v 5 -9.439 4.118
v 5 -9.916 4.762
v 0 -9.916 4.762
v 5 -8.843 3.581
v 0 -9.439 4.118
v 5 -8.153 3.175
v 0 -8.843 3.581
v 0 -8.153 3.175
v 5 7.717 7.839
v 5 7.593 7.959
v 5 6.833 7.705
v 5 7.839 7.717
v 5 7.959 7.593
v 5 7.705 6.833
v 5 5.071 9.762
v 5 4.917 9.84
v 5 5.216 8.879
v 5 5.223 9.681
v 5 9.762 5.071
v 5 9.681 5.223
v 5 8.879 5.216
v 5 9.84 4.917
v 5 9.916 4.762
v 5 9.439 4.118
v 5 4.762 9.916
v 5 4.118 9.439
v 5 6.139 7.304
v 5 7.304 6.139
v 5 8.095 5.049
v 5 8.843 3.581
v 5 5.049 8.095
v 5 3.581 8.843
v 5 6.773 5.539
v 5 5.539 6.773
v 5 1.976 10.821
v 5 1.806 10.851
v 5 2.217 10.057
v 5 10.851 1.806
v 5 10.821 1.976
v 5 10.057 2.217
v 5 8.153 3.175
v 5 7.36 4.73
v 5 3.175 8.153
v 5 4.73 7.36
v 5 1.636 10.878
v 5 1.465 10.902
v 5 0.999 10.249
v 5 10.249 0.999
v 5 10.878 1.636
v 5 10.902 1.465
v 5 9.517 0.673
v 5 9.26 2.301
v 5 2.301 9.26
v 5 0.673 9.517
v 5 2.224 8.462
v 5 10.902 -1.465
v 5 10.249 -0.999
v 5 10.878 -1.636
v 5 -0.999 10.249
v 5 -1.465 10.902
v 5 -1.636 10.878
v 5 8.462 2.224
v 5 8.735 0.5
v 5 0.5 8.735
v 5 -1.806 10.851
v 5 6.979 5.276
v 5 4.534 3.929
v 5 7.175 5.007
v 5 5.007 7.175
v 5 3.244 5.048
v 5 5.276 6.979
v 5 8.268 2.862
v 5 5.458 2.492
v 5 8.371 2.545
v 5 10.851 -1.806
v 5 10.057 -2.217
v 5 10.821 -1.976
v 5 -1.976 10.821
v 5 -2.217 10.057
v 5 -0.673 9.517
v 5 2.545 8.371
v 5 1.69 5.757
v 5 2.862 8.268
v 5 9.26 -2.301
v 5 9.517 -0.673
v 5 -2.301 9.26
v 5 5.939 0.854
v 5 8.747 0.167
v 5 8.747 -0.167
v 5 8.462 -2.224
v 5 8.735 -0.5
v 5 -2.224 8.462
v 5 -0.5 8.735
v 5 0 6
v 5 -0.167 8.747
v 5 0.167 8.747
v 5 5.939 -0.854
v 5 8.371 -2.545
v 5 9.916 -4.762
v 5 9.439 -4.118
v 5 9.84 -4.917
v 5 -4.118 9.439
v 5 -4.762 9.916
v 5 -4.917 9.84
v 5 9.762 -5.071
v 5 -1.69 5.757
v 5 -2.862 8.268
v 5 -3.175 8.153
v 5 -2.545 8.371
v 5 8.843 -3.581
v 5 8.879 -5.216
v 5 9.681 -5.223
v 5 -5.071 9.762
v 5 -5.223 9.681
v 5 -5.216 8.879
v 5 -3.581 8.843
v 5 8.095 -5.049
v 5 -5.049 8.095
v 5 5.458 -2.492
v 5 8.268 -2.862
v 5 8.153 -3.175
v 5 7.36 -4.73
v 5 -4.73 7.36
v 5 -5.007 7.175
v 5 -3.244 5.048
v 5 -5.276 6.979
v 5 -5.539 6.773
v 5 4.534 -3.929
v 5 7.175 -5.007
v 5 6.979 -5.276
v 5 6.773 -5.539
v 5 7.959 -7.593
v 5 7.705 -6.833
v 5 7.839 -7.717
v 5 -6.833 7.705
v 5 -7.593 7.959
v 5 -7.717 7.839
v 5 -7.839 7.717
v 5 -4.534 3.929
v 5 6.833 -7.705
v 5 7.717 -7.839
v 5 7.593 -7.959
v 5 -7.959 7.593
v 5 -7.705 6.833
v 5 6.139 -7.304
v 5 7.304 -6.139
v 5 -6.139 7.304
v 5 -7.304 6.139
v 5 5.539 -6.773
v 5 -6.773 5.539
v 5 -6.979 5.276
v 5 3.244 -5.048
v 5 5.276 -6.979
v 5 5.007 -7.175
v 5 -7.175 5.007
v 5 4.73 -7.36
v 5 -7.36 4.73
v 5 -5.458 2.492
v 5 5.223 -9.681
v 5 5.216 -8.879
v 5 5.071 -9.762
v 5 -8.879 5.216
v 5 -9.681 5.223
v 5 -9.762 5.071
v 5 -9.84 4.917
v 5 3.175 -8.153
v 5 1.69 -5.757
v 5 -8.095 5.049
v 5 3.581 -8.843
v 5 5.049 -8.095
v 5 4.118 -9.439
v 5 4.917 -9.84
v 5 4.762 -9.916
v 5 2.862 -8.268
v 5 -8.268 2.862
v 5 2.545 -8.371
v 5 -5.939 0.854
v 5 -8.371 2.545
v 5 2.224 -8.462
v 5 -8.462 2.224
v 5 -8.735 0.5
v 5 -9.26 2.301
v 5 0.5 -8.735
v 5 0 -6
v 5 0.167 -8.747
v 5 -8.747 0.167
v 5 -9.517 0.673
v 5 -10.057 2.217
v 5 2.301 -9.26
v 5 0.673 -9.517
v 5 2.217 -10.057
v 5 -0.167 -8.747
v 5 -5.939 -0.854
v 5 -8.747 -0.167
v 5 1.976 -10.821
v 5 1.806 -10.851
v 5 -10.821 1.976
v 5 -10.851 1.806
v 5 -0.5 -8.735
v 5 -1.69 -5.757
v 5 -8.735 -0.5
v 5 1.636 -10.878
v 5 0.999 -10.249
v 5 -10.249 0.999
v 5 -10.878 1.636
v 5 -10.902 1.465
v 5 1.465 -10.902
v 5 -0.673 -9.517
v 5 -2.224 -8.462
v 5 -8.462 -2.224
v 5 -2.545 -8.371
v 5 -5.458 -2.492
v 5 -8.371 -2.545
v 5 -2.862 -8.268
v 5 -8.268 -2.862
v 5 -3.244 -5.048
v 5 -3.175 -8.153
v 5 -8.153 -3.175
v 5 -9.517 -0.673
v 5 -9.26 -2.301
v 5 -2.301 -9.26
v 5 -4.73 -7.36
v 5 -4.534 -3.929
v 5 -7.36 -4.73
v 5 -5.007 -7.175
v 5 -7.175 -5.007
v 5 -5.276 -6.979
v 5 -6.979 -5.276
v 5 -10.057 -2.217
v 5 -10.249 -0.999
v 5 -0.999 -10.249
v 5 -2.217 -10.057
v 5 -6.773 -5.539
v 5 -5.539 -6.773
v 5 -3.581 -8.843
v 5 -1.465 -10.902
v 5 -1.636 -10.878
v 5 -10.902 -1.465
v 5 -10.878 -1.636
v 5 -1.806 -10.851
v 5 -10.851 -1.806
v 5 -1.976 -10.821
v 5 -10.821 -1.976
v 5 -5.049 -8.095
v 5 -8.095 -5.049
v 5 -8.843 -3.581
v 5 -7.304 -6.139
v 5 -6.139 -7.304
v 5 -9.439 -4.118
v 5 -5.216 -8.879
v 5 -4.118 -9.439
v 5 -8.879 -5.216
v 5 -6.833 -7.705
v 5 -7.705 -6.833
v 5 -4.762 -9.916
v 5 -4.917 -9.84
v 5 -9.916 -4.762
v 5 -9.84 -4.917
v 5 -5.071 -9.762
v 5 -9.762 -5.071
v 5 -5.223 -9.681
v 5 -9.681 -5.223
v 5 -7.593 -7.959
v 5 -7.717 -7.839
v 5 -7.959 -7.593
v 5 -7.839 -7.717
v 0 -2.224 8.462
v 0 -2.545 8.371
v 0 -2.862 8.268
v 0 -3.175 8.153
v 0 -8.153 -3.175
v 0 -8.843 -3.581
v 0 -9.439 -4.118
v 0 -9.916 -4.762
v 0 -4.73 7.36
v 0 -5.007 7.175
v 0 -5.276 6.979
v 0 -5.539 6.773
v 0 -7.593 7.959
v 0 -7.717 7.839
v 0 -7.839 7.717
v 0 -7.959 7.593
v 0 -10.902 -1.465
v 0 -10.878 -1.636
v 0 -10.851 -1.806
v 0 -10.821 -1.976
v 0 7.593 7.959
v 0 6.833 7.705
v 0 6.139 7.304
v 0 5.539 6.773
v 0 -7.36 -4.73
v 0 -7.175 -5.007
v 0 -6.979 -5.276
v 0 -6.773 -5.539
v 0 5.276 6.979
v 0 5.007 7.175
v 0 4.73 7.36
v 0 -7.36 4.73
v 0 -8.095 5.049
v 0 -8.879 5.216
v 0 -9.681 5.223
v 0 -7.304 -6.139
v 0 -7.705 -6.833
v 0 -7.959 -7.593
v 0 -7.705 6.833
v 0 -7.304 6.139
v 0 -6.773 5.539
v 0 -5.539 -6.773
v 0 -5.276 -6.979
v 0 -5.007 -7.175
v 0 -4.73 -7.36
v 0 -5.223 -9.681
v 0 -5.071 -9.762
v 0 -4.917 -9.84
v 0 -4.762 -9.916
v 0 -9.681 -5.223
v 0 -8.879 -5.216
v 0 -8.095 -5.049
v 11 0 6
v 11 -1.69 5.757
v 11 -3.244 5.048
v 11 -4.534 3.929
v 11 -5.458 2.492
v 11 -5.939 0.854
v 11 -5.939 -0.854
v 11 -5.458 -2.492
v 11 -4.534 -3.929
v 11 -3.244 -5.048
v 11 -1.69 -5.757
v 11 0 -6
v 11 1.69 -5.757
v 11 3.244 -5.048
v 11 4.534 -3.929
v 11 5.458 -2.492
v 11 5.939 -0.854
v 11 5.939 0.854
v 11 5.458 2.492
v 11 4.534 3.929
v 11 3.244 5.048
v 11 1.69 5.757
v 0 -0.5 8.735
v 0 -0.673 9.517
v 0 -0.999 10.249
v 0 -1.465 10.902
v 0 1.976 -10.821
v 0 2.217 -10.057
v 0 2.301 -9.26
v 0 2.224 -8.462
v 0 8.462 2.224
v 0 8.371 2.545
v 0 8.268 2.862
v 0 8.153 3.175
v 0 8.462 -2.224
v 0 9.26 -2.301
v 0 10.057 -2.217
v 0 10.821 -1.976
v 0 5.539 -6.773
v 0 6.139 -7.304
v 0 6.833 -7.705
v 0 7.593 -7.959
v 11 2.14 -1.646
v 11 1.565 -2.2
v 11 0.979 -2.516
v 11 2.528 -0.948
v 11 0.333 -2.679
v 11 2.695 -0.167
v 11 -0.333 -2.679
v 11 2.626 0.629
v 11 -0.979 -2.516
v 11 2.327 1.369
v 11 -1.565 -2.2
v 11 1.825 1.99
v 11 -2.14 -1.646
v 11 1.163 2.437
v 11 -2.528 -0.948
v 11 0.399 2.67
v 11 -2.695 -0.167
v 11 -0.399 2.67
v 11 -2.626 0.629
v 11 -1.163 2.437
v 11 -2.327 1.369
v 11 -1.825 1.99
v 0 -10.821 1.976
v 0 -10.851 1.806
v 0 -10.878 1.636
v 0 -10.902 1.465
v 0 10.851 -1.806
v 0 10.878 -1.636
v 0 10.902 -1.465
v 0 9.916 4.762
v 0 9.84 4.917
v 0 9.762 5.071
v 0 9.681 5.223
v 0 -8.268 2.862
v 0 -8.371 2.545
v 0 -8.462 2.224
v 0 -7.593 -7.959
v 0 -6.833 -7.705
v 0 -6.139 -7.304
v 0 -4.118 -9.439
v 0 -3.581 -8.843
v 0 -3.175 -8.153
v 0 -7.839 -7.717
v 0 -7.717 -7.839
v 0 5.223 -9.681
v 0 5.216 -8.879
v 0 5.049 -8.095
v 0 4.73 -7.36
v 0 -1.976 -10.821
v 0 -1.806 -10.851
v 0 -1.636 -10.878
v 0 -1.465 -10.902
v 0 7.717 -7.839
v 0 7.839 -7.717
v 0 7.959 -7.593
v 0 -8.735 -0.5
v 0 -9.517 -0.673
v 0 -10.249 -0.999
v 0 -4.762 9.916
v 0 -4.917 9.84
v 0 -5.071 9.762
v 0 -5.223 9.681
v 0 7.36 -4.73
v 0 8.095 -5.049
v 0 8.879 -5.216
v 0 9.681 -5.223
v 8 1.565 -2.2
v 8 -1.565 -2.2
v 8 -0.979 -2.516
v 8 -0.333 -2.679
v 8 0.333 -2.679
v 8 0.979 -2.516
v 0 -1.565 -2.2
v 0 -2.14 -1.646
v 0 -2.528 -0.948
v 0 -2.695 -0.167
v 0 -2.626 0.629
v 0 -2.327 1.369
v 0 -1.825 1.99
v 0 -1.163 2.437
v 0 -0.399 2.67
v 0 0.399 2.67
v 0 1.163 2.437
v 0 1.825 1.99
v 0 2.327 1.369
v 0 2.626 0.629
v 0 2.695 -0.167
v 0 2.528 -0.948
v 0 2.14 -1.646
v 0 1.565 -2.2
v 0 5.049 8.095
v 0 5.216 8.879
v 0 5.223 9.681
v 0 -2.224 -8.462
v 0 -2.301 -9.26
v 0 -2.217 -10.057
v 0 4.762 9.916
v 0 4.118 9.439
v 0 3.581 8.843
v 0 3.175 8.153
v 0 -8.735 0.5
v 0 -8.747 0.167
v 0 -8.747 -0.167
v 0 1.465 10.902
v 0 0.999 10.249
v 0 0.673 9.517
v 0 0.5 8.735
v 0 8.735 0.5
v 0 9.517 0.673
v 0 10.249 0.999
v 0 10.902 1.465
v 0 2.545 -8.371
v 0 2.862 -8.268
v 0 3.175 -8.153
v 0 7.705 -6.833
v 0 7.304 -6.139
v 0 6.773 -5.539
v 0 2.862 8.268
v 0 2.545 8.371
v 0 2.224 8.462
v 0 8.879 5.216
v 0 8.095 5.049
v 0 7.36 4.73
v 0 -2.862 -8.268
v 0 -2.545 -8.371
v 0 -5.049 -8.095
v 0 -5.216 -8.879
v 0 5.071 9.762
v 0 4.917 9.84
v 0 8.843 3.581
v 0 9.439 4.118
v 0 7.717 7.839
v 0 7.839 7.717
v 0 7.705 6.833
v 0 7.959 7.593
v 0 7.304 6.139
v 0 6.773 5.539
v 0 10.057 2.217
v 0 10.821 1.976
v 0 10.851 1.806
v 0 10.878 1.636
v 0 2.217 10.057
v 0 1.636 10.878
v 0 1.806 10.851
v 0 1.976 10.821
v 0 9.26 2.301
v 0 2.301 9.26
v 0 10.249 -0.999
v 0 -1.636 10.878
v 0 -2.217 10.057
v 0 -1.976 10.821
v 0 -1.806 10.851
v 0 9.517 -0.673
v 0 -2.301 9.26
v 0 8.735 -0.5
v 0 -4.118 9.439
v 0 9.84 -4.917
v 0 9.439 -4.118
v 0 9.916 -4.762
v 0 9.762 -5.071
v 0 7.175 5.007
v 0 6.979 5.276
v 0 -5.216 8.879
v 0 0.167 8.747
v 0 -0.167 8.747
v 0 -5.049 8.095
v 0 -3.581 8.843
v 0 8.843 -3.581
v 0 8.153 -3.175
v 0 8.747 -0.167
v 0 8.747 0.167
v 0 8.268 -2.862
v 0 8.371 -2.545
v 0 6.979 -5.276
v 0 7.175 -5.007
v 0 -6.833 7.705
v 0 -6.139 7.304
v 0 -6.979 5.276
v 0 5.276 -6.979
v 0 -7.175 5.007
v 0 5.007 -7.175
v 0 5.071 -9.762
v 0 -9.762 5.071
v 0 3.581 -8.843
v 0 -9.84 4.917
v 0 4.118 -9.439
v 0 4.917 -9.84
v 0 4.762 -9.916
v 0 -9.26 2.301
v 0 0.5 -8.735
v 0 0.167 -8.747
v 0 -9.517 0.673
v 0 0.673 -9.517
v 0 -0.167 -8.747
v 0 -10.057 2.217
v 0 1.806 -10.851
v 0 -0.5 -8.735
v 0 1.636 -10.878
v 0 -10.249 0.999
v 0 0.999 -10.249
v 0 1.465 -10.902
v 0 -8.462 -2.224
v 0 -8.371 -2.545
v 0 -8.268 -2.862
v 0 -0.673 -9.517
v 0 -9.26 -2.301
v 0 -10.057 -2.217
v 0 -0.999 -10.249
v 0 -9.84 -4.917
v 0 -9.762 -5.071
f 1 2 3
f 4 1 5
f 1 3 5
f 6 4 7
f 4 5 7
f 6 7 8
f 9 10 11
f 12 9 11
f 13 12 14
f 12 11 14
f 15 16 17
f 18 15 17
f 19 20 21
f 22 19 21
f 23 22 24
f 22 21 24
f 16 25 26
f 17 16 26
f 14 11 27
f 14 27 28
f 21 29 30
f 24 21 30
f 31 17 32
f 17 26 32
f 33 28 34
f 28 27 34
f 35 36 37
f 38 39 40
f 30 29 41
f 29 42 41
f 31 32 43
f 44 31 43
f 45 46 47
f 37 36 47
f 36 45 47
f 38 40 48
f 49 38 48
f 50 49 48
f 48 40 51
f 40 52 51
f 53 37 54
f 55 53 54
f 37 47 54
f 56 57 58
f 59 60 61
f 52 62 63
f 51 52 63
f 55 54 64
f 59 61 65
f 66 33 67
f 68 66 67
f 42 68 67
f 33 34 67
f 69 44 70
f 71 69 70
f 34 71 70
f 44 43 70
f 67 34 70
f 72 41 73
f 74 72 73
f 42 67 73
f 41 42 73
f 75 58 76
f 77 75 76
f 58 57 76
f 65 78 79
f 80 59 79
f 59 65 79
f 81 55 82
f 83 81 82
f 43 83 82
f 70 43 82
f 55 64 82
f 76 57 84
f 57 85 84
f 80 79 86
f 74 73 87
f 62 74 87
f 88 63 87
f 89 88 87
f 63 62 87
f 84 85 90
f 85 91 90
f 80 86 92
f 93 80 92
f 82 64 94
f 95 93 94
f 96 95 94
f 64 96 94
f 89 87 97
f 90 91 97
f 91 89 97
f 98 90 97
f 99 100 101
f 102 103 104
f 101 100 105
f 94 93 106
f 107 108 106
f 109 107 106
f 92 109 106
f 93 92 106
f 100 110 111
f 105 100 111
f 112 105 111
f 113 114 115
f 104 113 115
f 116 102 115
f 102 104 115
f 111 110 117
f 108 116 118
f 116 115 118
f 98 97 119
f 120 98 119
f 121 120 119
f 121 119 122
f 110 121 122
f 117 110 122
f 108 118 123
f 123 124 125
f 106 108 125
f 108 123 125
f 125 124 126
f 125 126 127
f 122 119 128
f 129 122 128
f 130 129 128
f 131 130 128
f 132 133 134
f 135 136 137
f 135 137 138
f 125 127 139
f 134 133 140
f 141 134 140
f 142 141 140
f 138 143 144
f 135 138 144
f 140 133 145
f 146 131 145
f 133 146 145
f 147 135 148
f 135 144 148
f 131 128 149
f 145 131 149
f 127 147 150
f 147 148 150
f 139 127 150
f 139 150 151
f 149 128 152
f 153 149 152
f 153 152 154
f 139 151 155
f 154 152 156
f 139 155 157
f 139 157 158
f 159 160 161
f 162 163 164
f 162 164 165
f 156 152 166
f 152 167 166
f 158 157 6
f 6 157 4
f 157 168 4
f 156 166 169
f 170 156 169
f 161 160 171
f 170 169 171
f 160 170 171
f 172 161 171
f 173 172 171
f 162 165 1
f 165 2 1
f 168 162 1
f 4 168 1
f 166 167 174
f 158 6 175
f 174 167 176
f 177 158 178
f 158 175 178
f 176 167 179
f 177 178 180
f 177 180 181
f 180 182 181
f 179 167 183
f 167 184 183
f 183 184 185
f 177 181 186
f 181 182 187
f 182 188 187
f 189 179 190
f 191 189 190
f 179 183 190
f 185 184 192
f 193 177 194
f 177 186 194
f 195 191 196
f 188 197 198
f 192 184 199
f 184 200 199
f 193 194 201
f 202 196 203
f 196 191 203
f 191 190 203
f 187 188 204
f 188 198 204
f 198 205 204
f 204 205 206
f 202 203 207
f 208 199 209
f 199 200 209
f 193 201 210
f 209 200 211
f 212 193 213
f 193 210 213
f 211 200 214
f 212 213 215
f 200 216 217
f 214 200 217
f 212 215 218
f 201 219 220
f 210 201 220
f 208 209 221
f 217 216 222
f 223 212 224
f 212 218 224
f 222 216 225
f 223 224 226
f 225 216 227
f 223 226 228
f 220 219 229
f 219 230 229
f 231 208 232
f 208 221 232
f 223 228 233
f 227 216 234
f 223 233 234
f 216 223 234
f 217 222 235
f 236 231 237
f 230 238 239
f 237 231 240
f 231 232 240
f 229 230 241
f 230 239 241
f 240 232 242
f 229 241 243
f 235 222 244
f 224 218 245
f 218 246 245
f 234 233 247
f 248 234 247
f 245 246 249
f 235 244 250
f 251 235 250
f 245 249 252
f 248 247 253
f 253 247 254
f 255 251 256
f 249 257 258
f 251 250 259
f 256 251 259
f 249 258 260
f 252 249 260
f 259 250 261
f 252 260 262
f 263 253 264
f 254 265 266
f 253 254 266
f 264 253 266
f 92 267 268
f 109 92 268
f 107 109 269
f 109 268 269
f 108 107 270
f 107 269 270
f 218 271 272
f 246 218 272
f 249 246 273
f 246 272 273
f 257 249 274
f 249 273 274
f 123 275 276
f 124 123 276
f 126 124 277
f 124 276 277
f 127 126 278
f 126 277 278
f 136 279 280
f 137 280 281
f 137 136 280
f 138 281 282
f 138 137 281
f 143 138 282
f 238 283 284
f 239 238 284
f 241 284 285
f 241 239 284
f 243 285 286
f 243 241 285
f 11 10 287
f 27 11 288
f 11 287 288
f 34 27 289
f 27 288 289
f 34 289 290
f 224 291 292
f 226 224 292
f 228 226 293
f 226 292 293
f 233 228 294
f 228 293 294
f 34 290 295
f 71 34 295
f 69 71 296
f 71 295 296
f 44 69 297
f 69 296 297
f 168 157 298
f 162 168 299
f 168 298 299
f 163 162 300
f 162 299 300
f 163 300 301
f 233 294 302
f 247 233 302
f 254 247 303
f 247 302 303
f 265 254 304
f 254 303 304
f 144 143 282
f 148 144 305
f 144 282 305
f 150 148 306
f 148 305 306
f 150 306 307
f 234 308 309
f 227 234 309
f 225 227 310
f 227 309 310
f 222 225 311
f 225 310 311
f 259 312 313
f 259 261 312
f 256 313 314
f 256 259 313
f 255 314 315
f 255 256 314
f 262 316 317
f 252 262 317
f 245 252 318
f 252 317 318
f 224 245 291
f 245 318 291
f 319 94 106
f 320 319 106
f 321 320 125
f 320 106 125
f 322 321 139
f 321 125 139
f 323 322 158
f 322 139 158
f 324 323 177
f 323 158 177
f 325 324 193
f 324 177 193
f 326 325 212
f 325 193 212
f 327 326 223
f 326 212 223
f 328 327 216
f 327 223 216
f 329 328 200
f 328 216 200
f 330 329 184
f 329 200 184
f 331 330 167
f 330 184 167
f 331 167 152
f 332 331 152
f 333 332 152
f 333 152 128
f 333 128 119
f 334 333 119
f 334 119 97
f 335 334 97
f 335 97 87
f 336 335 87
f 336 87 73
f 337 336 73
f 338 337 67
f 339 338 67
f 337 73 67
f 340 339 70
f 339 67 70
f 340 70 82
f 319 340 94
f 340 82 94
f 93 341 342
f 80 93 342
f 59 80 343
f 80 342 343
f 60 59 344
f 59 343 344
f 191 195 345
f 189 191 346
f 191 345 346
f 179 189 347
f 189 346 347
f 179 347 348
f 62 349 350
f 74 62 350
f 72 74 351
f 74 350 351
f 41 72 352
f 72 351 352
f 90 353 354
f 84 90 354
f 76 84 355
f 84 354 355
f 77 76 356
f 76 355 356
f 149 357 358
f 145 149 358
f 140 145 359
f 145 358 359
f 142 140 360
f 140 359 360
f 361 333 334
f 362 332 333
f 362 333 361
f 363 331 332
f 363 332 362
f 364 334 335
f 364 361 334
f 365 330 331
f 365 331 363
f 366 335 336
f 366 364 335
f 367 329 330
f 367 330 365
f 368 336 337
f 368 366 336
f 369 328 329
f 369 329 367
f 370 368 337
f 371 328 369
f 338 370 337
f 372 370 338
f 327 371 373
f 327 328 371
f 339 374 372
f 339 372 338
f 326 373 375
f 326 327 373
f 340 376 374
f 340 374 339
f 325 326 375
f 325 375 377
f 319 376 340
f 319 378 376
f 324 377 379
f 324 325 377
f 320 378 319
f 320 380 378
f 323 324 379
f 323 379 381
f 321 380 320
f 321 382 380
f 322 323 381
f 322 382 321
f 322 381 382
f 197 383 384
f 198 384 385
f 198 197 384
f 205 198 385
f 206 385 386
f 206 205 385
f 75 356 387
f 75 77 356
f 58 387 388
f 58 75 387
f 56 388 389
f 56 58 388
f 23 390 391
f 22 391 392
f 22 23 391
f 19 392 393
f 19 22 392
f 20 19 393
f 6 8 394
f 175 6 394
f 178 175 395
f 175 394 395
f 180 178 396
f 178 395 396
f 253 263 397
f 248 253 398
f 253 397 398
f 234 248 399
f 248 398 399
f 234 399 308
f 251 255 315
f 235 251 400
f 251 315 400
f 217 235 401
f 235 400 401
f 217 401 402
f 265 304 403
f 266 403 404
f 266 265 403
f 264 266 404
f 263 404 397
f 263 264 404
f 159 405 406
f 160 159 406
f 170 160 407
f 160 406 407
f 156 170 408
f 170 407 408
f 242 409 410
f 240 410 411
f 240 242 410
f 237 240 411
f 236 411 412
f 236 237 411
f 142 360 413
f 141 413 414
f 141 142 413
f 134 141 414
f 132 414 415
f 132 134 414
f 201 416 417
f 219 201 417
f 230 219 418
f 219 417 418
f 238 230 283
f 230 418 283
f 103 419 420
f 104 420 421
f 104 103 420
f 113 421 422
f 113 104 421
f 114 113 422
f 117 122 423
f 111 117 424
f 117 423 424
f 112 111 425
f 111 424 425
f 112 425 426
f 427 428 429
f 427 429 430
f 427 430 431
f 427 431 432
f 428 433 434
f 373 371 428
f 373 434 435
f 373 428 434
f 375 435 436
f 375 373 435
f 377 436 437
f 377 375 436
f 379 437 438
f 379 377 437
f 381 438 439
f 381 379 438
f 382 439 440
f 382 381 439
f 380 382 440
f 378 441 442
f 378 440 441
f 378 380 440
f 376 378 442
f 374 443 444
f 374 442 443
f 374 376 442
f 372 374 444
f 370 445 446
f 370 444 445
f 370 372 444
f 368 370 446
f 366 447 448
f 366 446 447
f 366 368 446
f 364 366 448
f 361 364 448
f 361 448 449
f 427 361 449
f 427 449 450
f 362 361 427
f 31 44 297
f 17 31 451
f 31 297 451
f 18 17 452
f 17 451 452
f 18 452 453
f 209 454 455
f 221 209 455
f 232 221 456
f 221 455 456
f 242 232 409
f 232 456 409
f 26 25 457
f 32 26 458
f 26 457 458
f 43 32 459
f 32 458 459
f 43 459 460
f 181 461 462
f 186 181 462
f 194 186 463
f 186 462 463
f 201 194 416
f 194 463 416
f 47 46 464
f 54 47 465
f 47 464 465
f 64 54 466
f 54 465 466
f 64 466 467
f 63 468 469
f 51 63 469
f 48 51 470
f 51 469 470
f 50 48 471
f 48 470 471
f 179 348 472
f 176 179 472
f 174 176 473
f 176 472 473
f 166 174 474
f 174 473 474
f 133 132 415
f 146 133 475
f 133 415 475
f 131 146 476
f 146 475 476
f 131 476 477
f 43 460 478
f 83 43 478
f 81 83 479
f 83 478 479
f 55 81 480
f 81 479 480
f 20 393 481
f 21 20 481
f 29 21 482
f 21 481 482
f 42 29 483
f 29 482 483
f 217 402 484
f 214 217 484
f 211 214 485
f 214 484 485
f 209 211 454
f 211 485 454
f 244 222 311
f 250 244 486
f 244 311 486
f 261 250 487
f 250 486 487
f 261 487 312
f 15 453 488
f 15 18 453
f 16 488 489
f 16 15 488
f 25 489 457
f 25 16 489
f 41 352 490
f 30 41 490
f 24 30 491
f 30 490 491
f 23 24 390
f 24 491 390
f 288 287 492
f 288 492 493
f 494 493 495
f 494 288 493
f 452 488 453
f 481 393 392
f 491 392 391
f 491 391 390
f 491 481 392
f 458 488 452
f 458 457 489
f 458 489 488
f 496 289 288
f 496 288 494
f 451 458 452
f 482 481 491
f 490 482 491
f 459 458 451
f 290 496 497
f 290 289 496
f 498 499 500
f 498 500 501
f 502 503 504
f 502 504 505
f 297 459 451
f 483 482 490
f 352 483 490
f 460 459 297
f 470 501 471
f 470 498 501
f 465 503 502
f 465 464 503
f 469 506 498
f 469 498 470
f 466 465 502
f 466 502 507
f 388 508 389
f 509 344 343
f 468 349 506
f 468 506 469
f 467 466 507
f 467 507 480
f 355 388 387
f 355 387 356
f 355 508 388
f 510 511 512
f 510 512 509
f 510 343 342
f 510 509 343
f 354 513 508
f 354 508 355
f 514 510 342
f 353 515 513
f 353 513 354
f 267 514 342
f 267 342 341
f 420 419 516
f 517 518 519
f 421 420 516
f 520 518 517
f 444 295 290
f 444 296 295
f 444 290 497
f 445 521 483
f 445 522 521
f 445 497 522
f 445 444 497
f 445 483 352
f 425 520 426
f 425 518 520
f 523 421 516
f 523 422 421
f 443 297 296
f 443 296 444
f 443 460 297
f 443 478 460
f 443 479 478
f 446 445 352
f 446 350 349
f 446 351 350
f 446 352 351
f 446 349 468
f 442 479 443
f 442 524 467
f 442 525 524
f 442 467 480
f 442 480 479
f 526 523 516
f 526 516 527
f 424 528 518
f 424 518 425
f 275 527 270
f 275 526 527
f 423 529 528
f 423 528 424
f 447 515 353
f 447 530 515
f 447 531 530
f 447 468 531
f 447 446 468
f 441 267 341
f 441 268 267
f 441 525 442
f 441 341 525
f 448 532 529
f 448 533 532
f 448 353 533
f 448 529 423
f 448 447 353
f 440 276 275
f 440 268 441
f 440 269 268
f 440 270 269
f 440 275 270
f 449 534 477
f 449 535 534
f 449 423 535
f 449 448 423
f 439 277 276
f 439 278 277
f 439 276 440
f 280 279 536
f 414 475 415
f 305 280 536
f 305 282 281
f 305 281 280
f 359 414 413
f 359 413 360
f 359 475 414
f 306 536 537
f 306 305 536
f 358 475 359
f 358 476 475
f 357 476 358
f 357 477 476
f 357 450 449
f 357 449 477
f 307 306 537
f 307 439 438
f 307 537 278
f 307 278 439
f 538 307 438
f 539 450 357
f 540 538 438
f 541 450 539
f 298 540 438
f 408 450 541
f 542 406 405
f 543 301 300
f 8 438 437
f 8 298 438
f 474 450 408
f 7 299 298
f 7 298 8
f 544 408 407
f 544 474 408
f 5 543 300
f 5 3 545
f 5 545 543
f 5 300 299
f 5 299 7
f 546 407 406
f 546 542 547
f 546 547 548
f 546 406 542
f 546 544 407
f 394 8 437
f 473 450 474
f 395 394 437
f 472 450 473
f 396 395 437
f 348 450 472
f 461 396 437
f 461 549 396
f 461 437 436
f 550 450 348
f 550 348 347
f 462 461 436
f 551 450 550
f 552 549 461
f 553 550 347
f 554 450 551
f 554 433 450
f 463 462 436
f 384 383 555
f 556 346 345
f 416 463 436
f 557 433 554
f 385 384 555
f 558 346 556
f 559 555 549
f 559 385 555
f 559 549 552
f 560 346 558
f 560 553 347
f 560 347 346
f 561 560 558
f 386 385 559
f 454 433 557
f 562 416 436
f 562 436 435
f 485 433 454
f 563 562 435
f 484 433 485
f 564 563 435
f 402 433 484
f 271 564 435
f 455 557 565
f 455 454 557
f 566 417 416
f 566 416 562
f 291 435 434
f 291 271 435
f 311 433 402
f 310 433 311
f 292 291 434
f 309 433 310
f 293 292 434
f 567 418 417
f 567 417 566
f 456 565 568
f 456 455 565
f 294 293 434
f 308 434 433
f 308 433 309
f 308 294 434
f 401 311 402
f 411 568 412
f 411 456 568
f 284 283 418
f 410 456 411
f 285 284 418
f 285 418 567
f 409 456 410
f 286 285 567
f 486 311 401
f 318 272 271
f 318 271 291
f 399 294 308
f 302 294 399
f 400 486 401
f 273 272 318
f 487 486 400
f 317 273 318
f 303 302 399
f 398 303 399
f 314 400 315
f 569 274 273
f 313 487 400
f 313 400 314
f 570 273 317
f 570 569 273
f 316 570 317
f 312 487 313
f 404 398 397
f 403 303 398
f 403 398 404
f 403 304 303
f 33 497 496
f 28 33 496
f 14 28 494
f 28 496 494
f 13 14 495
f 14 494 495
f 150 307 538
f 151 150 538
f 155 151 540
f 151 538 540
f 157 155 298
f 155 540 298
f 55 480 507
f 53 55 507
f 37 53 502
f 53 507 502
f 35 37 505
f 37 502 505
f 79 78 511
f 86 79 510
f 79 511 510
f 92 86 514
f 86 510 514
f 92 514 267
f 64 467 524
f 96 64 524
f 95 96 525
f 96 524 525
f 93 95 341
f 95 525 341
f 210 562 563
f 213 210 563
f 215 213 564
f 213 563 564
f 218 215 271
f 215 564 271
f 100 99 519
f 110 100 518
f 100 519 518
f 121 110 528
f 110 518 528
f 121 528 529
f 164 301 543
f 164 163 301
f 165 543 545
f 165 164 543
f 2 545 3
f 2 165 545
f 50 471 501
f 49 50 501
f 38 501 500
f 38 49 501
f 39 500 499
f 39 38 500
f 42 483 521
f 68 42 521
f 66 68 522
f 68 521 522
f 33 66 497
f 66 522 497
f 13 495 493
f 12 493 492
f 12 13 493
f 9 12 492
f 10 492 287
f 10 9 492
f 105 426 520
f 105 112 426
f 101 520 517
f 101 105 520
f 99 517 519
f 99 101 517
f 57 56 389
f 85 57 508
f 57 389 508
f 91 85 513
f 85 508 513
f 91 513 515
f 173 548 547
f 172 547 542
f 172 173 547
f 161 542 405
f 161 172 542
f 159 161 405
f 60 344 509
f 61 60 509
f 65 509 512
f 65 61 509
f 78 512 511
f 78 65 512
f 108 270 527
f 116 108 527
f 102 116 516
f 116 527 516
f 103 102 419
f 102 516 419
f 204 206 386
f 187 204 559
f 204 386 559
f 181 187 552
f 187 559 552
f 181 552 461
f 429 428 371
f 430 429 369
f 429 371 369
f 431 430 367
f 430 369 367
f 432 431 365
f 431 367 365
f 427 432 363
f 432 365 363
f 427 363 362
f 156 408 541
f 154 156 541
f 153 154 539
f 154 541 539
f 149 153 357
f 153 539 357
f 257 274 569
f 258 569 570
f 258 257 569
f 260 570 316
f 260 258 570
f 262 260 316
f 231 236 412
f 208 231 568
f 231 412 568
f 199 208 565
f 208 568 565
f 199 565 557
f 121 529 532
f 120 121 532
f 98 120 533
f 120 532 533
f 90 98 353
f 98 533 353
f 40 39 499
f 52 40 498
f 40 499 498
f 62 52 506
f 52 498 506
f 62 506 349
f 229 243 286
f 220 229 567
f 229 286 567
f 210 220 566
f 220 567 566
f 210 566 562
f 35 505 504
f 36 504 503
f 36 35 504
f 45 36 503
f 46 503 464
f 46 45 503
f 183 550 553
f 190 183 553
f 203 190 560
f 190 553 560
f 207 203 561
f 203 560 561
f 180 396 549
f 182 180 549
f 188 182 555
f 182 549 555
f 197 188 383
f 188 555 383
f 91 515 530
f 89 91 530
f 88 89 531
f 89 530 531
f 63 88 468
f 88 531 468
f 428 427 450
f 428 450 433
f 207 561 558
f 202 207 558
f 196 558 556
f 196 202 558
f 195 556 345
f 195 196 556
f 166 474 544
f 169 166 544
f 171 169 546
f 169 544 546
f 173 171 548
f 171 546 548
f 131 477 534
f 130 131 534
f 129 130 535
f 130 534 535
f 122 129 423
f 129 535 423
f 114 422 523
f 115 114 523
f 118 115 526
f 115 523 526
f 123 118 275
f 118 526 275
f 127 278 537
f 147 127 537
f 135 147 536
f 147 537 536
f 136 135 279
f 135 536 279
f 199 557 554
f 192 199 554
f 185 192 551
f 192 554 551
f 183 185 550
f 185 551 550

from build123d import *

# Parameters (mm, degrees)
BASPROSKE_W         = 5
BASPROSKE_H         = 11
TOOTHCUT_DEPTH      = 17.340134638
TEETHCUTS_COUNT     = 20
BORSKE_R            = 1.5
BORE_DEPTH          = 50.0000508
SKETCH_1_R          = 6
EXTRUDE_1_DEPTH     = 6
CUT_EXTRUDE_1_DEPTH = 14
SKETCH_3_R          = 2.7
CUT_EXTRUDE_2_DEPTH = 3


with BuildPart() as part:
    # BasProSke → Base-Revolve (revolve)
    with BuildSketch(Plane(origin=(0, 0, 0), x_dir=(1, 0, 0), z_dir=(0, 1, 0)), mode=Mode.PRIVATE) as base_revolve_sk:
        with Locations((2.5, 5.5)):
            Rectangle(BASPROSKE_W, BASPROSKE_H)
    revolve(base_revolve_sk.sketch.rotate(Axis((-10, 0, 0), (1, 0, 0)), 180), axis=Axis((-10, 0, 0), (1, 0, 0)))

    # TooCutSke → ToothCut (cut, through all)
    with BuildSketch(Plane(origin=(0, 0, 0), x_dir=(0, 0, -1), z_dir=(1, 0, 0))):
        with BuildLine():
            ThreePointArc((0.499924007, 8.734705318), (0, 8.749), (-0.499924007, 8.734705318))
            ThreePointArc((-0.499924007, 8.734705318), (-0.824302243, 9.905497836), (-1.485192705, 10.924909509))
            ThreePointArc((-1.485192705, 10.924909509), (0, 11.0254), (1.485192705, 10.924909509))
            ThreePointArc((1.485192705, 10.924909509), (0.824302243, 9.905497836), (0.499924007, 8.734705318))
        make_face()
    toothcut = extrude(amount=TOOTHCUT_DEPTH, mode=Mode.SUBTRACT)

    # TeethCuts: ToothCut ×20 about axis
    teethcuts_axis = Axis((0, 0, 0), (1, 0, 0))
    for i in range(1, TEETHCUTS_COUNT):
        add(toothcut.rotate(teethcuts_axis, i * 360 / TEETHCUTS_COUNT), mode=Mode.SUBTRACT)

    # BorSke → Bore (cut, symmetric)
    with BuildSketch(Plane(origin=(0, 0, 0), x_dir=(0, 0, -1), z_dir=(1, 0, 0))):
        with Locations(Location((0, 0, 0), (0, 0, 180))):
            Circle(BORSKE_R)
    extrude(amount=BORE_DEPTH, both=True, mode=Mode.SUBTRACT)

    # 草图1 → 凸台-拉伸1 (add)
    with BuildSketch(Plane(origin=(5, 0, 0), x_dir=(0, 0, -1), z_dir=(1, 0, 0))):
        with Locations(Location((0, 0, 0), (0, 0, 180))):
            Circle(SKETCH_1_R)
    extrude(amount=EXTRUDE_1_DEPTH)

    # 草图2 → 切除-拉伸1 (cut)
    with BuildSketch(Plane(origin=(11, 0, 0), x_dir=(0, 0, -1), z_dir=(1, 0, 0))):
        with BuildLine():
            Line((2.2, 1.565247584), (2.2, -1.565247584))
            ThreePointArc((2.2, -1.565247584), (-2.7, 0), (2.2, 1.565247584))
        make_face()
    extrude(amount=-CUT_EXTRUDE_1_DEPTH, mode=Mode.SUBTRACT)

    # 草图3 → 切除-拉伸2 (cut)
    with BuildSketch(Plane(origin=(11, 0, 0), x_dir=(0, 0, -1), z_dir=(1, 0, 0))):
        Circle(SKETCH_3_R)
    extrude(amount=-CUT_EXTRUDE_2_DEPTH, mode=Mode.SUBTRACT)


solid = part.part
